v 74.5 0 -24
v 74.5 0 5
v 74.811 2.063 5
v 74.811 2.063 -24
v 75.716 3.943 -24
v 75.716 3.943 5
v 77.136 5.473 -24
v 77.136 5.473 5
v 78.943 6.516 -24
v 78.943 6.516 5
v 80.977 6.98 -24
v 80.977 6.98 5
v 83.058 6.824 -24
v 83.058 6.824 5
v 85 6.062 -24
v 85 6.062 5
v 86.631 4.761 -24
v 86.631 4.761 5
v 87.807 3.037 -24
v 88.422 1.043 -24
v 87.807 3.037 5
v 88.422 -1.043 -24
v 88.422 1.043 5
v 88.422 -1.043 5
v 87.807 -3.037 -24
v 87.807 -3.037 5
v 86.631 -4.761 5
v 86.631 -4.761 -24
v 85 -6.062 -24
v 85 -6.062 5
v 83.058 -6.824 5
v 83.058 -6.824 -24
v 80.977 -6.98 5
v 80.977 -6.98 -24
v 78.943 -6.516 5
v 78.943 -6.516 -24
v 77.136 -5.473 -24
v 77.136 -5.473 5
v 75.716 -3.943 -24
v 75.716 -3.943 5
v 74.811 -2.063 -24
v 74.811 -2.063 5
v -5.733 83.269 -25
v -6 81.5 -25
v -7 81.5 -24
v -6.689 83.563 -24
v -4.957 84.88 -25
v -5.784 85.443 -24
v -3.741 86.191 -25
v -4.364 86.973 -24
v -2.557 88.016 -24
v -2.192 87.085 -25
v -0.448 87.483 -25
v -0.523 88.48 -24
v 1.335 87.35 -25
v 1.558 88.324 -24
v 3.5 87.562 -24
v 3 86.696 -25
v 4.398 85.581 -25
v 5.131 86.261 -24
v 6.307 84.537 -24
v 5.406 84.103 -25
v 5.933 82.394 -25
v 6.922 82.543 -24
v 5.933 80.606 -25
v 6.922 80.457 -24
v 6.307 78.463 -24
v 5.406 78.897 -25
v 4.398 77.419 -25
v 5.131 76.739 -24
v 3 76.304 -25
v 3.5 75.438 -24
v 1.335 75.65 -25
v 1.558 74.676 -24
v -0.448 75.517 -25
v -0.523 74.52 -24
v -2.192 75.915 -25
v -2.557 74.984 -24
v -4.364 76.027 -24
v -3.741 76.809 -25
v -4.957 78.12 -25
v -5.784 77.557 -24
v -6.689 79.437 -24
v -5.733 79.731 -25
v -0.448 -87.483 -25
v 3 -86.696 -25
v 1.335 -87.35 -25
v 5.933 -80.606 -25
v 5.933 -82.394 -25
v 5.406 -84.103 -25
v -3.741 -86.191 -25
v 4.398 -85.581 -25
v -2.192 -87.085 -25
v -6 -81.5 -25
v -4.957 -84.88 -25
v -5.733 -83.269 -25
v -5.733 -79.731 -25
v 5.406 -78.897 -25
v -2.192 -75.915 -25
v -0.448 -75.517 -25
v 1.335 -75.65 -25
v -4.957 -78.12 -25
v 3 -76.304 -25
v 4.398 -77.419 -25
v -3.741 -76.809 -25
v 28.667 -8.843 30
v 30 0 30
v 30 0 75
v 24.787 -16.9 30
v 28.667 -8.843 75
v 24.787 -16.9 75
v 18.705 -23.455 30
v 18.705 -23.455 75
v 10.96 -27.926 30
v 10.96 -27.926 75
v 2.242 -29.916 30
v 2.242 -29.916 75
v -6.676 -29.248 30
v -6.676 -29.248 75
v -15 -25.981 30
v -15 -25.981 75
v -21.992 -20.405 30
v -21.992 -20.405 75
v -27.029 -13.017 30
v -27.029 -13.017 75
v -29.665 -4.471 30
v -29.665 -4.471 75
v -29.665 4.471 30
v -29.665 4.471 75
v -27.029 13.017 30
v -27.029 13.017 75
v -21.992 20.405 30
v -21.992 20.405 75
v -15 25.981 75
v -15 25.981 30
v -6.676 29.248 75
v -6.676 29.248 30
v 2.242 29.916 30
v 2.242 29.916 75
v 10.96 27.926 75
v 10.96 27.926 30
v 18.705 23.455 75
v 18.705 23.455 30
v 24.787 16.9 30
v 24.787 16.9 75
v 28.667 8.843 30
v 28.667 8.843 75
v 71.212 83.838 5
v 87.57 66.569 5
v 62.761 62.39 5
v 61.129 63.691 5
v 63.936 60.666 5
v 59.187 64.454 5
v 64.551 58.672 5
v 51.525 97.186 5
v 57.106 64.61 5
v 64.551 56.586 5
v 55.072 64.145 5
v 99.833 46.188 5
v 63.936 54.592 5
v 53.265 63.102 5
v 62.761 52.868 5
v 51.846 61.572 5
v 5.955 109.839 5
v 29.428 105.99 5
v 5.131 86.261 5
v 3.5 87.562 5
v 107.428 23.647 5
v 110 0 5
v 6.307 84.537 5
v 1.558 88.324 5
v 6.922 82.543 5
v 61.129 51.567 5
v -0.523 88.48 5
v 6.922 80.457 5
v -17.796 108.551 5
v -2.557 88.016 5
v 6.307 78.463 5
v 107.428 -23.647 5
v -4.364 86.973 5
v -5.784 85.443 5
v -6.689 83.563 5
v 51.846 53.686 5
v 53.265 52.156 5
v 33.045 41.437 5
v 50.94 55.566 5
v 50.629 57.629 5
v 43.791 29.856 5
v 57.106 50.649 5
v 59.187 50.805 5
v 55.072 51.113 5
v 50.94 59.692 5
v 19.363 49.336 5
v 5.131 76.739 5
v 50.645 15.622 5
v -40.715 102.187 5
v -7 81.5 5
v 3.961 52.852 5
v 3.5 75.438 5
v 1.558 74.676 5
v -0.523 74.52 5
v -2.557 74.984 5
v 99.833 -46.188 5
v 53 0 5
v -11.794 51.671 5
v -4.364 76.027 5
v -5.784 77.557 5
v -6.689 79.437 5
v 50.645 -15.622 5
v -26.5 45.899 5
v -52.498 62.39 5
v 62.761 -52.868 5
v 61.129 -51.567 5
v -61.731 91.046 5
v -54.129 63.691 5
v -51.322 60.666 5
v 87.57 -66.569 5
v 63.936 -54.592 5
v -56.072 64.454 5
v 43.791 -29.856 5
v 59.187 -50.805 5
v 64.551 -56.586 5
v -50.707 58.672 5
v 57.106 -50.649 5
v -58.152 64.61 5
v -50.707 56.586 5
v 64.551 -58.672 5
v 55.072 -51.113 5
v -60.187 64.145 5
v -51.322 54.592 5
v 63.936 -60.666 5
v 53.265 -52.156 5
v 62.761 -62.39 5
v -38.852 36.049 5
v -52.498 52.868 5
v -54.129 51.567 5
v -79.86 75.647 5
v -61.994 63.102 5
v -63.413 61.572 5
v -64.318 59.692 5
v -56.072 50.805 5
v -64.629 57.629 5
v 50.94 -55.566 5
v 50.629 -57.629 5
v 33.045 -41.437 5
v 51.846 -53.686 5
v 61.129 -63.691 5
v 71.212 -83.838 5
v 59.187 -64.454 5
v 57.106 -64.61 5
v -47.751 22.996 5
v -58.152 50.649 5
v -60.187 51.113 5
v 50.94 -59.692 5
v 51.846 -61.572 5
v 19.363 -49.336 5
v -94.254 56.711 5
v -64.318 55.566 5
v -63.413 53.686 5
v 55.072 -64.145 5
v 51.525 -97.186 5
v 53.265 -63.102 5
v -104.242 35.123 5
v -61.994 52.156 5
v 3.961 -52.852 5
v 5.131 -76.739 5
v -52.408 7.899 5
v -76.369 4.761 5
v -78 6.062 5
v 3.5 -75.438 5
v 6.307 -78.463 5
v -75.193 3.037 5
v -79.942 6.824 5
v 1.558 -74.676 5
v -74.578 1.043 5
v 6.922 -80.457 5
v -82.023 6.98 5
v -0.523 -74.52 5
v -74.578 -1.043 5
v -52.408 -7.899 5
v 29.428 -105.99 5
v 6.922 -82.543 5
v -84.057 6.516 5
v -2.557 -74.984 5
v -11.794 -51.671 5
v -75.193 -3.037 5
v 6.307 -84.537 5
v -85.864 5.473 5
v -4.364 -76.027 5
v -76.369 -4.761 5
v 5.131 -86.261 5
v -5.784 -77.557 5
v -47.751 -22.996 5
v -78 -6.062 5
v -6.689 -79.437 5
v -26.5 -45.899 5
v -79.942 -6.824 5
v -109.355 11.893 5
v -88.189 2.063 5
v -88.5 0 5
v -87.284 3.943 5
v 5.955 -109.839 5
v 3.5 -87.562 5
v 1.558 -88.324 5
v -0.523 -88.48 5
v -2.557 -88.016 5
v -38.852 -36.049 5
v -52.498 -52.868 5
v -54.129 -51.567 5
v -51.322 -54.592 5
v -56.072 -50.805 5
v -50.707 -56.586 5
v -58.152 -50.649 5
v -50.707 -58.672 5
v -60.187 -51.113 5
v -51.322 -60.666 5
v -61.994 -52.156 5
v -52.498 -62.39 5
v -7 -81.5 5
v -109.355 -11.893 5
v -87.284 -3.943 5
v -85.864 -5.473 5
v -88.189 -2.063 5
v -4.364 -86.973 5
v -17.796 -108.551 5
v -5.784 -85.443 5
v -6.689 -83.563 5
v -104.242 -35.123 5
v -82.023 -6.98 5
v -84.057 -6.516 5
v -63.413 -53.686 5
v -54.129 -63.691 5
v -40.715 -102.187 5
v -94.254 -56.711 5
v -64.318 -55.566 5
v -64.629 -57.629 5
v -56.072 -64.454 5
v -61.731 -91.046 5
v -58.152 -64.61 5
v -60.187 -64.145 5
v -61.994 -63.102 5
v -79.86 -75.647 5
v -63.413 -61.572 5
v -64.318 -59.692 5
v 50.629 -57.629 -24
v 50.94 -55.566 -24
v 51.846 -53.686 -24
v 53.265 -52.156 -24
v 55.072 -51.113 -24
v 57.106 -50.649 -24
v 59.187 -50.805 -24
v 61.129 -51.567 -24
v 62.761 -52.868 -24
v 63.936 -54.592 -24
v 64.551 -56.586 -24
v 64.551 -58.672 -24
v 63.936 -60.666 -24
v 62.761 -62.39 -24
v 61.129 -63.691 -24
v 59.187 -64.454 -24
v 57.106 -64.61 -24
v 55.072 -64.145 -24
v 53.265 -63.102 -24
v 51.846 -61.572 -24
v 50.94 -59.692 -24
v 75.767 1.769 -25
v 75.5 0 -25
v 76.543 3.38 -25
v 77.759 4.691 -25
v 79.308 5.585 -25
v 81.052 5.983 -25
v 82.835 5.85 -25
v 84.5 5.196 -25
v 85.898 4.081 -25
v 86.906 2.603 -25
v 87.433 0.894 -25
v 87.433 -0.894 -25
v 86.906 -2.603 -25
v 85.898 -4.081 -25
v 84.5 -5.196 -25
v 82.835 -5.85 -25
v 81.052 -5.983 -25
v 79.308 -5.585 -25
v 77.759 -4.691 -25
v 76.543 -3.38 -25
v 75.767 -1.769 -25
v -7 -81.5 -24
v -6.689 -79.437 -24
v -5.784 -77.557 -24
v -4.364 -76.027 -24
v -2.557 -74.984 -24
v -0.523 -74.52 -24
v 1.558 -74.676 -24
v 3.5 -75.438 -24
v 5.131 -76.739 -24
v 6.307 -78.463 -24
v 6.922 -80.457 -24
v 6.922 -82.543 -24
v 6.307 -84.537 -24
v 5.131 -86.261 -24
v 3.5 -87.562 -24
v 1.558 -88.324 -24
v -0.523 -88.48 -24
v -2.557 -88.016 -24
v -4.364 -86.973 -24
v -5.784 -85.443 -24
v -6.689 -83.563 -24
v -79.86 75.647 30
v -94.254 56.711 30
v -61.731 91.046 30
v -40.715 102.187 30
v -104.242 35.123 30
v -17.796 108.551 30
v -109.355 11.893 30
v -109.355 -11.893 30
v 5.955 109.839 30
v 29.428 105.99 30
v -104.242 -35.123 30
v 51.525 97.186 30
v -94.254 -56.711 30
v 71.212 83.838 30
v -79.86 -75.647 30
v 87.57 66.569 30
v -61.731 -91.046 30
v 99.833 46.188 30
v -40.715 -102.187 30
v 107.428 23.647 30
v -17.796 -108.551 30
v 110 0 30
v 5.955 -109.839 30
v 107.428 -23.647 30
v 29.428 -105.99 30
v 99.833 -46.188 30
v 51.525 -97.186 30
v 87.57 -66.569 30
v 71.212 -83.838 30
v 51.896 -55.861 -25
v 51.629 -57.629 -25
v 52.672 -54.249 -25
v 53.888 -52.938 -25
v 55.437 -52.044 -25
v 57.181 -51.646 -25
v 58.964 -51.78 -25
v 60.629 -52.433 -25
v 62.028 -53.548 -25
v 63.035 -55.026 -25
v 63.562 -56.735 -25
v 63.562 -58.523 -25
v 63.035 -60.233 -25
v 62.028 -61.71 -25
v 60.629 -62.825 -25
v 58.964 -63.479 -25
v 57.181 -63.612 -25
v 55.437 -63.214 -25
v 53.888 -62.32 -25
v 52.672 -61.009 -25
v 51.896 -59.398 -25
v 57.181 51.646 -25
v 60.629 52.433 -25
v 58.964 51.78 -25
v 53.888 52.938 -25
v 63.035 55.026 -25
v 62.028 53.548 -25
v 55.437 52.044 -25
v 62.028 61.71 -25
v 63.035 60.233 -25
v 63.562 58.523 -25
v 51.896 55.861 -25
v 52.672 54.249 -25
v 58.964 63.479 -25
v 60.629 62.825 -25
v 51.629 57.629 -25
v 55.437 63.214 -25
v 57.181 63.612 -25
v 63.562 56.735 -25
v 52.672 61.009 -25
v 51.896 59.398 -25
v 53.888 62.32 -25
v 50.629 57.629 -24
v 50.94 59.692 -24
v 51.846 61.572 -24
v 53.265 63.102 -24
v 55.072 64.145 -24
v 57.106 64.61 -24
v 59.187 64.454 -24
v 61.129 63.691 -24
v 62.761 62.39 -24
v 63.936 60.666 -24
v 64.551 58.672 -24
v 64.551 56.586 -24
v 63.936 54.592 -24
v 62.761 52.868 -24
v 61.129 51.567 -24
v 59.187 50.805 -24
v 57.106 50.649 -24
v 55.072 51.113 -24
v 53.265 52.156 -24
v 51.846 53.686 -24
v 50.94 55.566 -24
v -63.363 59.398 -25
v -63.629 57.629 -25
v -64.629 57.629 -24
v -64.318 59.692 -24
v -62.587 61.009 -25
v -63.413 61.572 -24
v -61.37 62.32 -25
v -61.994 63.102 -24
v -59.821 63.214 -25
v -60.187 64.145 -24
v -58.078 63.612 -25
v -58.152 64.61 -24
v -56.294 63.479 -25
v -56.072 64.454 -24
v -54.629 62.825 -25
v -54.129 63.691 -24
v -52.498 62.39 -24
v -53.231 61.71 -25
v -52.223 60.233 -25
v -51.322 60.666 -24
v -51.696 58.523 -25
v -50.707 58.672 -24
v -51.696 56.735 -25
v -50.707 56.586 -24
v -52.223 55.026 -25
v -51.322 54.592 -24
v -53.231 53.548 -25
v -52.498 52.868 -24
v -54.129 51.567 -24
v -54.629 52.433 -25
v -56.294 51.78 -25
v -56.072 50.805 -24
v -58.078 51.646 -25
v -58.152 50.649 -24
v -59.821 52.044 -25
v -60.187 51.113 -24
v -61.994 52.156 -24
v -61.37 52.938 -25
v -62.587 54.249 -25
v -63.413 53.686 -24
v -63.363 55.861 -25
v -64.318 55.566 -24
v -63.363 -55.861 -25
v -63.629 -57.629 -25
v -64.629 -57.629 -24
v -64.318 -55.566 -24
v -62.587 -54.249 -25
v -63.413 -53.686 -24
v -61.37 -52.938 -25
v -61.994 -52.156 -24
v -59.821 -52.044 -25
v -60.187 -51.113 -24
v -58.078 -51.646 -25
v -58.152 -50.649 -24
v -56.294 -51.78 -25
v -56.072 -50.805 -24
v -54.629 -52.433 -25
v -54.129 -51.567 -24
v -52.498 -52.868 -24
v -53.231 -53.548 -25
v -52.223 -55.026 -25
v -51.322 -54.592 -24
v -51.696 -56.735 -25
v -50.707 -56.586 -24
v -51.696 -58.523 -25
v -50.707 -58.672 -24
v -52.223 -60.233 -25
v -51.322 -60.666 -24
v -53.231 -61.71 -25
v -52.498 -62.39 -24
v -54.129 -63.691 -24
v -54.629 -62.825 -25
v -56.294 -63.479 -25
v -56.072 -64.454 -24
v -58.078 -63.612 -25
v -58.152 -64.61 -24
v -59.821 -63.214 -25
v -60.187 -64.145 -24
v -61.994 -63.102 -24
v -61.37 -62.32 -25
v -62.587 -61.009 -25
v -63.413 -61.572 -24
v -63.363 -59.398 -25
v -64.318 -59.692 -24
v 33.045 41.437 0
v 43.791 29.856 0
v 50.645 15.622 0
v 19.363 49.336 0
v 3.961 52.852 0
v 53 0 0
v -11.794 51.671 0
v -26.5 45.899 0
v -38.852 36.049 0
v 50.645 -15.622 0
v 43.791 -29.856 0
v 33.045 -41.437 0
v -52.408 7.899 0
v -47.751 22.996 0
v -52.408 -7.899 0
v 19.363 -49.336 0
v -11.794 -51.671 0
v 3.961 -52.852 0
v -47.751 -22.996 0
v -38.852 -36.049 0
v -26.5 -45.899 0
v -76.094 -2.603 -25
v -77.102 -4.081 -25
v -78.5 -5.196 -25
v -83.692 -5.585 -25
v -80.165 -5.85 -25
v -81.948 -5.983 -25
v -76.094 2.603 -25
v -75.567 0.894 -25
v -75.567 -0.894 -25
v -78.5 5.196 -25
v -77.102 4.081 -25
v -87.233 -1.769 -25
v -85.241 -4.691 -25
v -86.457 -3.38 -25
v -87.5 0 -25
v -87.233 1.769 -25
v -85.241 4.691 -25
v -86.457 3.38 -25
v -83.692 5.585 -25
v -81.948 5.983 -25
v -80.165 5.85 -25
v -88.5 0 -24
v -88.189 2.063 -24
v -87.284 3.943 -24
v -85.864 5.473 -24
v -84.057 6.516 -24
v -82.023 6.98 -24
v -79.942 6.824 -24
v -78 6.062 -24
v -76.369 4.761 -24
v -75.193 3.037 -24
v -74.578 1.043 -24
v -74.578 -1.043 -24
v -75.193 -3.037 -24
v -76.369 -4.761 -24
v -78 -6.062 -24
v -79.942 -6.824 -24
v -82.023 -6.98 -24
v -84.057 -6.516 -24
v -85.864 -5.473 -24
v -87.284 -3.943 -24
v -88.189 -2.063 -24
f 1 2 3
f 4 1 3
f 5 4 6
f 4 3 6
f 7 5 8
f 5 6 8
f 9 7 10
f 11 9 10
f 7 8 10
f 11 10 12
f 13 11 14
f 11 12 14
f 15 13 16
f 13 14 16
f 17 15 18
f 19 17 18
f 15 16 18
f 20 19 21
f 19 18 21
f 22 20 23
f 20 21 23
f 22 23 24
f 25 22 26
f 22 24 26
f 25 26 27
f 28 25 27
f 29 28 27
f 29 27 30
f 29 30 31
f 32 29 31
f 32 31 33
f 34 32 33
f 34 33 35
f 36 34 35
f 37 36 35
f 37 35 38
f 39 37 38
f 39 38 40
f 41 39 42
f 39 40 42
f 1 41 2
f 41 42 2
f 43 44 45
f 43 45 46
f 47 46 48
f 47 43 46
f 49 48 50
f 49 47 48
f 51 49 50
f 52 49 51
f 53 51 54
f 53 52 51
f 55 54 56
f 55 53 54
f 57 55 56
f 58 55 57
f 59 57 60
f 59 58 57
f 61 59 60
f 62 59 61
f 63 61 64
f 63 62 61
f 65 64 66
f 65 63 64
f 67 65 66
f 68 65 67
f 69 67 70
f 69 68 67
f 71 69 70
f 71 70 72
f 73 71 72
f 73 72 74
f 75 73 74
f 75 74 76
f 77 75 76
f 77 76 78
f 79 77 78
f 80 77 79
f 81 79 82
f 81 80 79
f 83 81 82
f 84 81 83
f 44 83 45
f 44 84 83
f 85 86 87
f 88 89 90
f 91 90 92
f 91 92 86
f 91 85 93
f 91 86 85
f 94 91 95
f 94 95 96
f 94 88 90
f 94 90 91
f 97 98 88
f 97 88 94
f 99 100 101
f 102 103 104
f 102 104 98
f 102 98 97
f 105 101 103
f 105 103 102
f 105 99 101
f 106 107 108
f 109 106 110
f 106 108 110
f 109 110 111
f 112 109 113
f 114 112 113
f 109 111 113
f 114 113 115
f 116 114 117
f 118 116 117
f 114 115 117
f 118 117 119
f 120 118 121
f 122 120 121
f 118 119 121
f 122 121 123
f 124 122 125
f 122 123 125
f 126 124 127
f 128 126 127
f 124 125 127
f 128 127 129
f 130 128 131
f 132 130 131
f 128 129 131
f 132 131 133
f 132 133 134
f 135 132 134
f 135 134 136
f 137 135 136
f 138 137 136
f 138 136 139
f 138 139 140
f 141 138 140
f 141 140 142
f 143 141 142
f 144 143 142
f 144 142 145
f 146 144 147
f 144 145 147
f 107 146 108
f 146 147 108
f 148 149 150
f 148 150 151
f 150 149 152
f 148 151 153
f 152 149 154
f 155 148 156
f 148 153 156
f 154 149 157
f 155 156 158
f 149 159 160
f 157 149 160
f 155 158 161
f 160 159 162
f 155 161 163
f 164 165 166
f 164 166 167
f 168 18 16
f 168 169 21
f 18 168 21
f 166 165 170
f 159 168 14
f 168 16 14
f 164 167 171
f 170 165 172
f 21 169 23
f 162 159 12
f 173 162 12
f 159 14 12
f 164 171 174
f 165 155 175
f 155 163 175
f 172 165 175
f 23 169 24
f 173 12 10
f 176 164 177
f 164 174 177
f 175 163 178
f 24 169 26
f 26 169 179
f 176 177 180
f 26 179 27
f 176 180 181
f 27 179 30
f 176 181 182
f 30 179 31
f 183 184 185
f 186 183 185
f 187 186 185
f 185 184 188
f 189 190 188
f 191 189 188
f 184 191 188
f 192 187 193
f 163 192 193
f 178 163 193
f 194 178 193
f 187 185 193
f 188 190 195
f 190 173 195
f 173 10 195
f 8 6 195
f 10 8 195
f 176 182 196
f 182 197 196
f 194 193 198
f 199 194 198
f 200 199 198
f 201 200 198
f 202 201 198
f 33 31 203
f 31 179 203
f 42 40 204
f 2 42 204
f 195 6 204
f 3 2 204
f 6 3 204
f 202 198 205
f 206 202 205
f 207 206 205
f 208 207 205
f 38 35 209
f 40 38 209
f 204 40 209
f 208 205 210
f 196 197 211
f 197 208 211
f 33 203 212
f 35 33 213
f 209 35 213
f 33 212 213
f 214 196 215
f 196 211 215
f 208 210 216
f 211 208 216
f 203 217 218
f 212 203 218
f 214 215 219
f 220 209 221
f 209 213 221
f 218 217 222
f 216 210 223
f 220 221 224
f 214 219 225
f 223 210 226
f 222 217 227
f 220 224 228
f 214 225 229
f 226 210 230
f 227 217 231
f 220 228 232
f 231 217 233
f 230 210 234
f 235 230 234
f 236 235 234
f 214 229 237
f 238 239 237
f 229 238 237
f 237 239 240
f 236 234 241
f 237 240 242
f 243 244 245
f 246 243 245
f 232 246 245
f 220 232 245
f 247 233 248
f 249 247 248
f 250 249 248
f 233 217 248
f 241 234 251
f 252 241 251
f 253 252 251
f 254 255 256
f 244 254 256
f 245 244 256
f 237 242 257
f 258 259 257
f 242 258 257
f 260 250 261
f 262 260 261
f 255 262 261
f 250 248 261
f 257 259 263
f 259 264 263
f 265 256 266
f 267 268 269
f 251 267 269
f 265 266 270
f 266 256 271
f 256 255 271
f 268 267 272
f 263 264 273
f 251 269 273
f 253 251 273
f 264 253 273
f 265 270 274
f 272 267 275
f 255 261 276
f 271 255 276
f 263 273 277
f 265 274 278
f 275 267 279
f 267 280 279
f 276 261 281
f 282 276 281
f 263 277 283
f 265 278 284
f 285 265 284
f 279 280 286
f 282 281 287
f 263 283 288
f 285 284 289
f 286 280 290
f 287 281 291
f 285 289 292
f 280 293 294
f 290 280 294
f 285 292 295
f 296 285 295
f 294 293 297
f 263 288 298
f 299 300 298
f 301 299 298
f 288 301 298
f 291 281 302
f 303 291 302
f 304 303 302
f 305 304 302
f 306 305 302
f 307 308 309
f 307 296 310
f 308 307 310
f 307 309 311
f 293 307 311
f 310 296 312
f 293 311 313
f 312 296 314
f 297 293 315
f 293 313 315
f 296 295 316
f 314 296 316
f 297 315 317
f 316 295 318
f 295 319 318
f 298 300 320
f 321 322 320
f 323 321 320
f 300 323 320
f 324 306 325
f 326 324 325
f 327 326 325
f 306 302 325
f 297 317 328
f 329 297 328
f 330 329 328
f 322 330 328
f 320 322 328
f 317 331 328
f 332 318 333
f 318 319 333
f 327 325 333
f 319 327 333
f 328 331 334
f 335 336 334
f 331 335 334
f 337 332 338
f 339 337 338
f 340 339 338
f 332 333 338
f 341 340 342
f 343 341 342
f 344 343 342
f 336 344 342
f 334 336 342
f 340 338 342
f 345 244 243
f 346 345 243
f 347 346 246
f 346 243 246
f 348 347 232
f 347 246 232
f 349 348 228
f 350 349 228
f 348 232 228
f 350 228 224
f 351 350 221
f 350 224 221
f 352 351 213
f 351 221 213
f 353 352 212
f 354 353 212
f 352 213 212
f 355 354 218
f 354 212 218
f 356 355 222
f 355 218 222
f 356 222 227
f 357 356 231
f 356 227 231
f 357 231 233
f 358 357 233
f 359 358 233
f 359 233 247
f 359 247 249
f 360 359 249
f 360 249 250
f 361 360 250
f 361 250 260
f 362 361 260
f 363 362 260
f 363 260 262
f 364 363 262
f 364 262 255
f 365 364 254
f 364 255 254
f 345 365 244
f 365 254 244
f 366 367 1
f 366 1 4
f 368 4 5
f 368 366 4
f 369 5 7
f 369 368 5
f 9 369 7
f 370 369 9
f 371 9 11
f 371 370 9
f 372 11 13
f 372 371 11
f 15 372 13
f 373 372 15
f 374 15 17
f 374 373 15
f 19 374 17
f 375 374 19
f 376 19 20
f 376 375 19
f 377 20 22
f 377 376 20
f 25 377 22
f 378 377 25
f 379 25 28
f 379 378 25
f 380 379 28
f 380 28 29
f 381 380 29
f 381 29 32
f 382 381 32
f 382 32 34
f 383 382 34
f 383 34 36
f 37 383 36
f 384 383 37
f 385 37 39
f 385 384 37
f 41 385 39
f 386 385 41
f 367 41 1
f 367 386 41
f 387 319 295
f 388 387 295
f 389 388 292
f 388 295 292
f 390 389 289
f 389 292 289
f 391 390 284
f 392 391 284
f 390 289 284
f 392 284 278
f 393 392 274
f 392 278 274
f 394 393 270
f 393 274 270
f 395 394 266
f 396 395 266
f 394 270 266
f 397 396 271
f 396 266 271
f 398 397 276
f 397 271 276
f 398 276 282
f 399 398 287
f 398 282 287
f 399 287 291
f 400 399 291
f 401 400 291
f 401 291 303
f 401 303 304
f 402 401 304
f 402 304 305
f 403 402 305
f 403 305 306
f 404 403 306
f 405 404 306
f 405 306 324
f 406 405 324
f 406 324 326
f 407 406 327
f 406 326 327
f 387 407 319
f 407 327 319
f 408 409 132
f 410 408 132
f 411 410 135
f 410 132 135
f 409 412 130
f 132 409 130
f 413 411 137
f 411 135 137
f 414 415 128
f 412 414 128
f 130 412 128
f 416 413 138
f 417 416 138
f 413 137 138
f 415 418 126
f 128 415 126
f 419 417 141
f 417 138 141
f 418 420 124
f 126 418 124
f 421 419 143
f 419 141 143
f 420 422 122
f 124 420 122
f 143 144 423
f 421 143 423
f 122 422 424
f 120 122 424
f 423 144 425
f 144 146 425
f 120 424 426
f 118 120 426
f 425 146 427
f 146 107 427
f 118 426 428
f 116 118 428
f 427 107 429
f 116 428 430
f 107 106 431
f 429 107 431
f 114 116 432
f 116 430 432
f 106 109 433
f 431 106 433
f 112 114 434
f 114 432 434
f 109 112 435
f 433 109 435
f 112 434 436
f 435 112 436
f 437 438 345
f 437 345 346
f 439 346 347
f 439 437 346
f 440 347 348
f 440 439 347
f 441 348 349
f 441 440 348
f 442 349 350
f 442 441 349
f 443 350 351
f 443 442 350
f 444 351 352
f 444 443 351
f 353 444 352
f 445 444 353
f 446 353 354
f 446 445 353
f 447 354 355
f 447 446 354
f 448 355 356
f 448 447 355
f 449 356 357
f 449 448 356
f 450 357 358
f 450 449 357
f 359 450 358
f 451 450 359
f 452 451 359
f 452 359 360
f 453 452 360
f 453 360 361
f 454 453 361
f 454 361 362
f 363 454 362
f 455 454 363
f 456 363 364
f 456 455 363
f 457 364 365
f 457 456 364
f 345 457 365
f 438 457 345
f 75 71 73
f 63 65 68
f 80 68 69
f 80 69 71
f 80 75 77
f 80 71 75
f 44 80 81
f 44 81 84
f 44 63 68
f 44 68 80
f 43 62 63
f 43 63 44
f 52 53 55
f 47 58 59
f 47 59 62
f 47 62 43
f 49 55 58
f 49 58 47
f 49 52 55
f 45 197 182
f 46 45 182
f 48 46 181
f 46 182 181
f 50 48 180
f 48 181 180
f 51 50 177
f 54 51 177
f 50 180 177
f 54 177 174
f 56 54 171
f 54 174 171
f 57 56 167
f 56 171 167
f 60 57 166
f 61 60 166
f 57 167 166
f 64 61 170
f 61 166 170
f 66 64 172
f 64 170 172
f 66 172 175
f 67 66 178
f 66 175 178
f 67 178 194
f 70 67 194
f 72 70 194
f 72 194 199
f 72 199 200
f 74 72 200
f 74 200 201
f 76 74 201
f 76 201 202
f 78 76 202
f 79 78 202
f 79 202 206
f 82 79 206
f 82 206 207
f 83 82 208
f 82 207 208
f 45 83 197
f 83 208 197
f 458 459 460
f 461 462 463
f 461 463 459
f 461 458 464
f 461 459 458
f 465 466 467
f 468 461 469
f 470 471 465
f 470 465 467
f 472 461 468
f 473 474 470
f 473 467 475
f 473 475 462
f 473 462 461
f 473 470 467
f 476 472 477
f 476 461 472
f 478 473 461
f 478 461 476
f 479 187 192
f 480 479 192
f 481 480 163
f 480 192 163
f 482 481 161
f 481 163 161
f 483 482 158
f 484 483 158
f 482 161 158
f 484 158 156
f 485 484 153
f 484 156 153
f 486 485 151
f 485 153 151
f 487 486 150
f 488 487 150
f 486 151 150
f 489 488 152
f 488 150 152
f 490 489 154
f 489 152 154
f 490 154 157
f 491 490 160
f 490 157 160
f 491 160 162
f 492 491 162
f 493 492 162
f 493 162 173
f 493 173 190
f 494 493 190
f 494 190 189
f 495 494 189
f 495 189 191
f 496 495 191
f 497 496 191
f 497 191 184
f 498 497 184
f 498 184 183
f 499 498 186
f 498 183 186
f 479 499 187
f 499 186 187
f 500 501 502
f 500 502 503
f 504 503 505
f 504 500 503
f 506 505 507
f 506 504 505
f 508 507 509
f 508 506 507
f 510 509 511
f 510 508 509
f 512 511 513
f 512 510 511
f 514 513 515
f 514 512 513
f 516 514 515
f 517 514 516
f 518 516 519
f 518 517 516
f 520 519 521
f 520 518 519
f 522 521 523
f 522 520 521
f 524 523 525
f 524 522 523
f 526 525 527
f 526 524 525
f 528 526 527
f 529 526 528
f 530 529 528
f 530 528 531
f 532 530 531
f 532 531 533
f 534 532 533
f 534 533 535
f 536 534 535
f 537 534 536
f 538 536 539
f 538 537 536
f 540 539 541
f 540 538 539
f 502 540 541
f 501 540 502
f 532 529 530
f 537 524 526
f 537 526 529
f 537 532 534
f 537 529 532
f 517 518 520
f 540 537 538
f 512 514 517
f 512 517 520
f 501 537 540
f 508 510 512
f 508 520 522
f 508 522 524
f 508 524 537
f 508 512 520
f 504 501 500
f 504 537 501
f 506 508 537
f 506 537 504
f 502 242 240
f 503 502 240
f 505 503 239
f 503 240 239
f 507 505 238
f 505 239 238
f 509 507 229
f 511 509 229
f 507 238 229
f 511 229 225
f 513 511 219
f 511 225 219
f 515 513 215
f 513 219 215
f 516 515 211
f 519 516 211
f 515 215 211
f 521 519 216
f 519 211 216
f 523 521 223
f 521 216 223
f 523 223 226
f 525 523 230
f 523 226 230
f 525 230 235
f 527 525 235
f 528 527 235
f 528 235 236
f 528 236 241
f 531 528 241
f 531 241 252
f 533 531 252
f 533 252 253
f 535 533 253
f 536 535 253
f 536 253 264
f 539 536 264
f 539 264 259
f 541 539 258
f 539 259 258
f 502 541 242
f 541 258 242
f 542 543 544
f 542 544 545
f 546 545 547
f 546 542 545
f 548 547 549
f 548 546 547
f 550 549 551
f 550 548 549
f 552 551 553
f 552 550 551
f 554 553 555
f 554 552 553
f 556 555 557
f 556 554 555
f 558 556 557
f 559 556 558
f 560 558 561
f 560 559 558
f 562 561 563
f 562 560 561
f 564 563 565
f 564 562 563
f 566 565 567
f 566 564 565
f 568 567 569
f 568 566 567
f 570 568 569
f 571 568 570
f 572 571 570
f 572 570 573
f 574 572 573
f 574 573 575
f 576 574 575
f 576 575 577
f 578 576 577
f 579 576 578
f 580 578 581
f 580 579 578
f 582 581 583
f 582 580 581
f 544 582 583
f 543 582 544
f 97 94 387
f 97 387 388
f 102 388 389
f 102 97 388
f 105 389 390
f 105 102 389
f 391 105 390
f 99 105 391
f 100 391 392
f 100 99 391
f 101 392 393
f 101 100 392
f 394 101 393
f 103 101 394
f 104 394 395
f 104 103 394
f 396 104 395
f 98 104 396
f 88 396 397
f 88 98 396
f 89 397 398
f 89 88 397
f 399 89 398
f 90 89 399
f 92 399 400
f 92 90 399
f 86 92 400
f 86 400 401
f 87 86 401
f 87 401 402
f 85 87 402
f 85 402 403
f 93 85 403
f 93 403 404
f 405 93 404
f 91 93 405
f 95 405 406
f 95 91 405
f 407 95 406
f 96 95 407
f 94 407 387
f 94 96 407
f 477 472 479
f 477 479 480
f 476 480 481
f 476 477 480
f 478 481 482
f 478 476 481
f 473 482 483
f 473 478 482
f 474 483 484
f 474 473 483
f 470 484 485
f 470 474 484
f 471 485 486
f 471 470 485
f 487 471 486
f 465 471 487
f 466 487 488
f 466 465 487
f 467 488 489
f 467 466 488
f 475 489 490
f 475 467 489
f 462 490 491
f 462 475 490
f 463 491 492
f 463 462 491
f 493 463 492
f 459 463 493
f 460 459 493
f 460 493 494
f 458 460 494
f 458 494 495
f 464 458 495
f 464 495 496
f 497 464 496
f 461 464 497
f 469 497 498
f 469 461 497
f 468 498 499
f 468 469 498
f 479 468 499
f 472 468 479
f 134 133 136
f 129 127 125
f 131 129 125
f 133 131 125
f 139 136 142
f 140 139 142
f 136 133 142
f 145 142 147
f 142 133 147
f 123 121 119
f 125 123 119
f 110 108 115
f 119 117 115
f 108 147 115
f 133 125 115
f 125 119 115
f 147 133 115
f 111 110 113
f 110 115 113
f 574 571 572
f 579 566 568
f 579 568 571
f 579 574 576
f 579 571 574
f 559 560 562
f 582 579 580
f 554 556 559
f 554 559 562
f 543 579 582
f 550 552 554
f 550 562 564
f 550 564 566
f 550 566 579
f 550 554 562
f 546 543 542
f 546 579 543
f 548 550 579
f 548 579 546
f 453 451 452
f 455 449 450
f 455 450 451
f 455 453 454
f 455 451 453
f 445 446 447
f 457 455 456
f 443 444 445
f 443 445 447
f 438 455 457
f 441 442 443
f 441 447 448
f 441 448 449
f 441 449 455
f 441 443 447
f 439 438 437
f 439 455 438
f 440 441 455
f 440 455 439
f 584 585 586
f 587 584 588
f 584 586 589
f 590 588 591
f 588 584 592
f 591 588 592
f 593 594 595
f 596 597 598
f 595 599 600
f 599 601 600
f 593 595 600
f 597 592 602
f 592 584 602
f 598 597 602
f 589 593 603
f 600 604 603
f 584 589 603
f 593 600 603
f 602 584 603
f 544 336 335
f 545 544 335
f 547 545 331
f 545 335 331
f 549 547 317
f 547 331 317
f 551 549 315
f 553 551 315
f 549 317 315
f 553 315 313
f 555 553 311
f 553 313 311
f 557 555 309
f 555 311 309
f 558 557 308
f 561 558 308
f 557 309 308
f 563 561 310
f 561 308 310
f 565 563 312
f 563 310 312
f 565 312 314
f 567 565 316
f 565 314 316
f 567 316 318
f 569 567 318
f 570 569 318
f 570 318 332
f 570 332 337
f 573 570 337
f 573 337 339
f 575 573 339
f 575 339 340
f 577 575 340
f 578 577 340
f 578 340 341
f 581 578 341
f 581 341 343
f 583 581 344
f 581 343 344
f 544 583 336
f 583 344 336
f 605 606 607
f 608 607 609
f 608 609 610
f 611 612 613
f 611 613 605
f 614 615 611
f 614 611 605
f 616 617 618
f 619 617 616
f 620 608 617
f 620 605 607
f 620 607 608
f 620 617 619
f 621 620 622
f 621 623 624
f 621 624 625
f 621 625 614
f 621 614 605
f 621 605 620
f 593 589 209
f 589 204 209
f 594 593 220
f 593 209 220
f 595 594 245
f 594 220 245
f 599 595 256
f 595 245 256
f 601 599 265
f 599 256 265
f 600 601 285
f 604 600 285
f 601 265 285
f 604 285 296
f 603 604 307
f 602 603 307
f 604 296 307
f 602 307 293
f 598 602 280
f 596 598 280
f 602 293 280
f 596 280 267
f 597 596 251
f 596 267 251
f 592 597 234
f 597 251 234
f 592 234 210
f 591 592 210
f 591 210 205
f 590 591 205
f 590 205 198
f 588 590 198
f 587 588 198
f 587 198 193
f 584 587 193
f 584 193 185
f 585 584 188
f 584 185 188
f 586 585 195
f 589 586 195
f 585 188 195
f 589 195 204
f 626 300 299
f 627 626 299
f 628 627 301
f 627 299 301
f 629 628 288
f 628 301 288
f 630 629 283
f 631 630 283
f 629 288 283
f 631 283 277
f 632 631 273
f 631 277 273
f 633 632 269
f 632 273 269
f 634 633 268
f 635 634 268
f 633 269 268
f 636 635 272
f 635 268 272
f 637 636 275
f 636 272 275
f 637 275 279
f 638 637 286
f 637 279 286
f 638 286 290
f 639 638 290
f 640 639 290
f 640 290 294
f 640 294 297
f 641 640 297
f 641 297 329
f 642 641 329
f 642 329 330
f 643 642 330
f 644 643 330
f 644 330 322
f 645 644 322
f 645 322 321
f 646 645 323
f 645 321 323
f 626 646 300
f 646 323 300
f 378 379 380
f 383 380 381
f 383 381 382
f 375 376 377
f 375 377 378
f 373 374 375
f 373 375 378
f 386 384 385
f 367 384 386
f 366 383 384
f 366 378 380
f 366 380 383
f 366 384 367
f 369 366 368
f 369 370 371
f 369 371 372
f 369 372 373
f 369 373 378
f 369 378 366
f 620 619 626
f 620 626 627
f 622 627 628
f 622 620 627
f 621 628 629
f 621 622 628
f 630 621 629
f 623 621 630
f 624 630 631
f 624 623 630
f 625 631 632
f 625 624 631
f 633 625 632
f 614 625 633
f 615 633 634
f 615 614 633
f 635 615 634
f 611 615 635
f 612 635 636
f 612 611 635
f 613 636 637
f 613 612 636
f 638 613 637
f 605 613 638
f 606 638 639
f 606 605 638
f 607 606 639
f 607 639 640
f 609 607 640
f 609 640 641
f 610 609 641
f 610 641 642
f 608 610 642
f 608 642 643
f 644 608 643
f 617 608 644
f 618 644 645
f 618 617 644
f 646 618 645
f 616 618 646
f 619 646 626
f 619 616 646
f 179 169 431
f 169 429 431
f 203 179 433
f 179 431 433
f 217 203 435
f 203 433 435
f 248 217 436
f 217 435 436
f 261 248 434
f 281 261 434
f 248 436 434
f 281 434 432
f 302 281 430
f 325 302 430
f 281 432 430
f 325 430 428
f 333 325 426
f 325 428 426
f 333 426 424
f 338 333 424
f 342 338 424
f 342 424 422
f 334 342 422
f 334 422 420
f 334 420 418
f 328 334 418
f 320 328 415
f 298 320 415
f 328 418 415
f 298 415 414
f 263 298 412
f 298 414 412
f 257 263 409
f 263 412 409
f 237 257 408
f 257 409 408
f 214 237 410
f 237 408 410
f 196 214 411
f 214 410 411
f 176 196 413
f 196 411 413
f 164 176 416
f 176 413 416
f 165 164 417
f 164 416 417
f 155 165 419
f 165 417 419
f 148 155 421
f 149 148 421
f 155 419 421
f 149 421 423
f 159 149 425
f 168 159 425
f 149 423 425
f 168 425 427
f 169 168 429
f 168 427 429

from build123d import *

# Parameters (mm, degrees)
SKETCH7_R           = 7
BOSS_EXTRUDE2_DEPTH = 30
CHAMFER2_SIZE       = 1


with BuildPart() as part:
    # Sketch6 → Revolve2 (revolve)
    with BuildSketch(Plane.XZ):
        Polygon((30, 75), (0, 75), (0, 0), (53, 0), (53, 5), (110, 5), (110, 30), (30, 30), align=None)
    revolve(axis=Axis((0, 0, 75), (0, 0, -1)))

    # Sketch7 → Boss-Extrude2 (add)
    with BuildSketch(Plane(origin=(0, 0, 5), x_dir=(-1, 0, 0), z_dir=(0, 0, -1))):
        with Locations((-57.629202667, -57.629202667)):
            Circle(SKETCH7_R)
        with Locations((-81.5, 0)):
            Circle(SKETCH7_R)
        with Locations((-57.629202667, 57.629202667)):
            Circle(SKETCH7_R)
        with Locations((0, 81.5)):
            Circle(SKETCH7_R)
        with Locations((57.629202667, 57.629202667)):
            Circle(SKETCH7_R)
        with Locations((81.5, 0)):
            Circle(SKETCH7_R)
        with Locations((0, -81.5)):
            Circle(SKETCH7_R)
        with Locations((57.629202667, -57.629202667)):
            Circle(SKETCH7_R)
    extrude(amount=BOSS_EXTRUDE2_DEPTH)

    # Chamfer2
    chamfer2_edges = [part.edges().sort_by_distance(p)[0] for p in [
        (64.629202667, -57.629202667, -25),
        (88.5, 0, -25),
        (64.629202667, 57.629202667, -25),
        (7, 81.5, -25),
        (-50.629202667, 57.629202667, -25),
        (7, -81.5, -25),
        (-74.5, 0, -25),
        (-50.629202667, -57.629202667, -25),
    ]]
    chamfer(chamfer2_edges, length=CHAMFER2_SIZE)


solid = part.part
